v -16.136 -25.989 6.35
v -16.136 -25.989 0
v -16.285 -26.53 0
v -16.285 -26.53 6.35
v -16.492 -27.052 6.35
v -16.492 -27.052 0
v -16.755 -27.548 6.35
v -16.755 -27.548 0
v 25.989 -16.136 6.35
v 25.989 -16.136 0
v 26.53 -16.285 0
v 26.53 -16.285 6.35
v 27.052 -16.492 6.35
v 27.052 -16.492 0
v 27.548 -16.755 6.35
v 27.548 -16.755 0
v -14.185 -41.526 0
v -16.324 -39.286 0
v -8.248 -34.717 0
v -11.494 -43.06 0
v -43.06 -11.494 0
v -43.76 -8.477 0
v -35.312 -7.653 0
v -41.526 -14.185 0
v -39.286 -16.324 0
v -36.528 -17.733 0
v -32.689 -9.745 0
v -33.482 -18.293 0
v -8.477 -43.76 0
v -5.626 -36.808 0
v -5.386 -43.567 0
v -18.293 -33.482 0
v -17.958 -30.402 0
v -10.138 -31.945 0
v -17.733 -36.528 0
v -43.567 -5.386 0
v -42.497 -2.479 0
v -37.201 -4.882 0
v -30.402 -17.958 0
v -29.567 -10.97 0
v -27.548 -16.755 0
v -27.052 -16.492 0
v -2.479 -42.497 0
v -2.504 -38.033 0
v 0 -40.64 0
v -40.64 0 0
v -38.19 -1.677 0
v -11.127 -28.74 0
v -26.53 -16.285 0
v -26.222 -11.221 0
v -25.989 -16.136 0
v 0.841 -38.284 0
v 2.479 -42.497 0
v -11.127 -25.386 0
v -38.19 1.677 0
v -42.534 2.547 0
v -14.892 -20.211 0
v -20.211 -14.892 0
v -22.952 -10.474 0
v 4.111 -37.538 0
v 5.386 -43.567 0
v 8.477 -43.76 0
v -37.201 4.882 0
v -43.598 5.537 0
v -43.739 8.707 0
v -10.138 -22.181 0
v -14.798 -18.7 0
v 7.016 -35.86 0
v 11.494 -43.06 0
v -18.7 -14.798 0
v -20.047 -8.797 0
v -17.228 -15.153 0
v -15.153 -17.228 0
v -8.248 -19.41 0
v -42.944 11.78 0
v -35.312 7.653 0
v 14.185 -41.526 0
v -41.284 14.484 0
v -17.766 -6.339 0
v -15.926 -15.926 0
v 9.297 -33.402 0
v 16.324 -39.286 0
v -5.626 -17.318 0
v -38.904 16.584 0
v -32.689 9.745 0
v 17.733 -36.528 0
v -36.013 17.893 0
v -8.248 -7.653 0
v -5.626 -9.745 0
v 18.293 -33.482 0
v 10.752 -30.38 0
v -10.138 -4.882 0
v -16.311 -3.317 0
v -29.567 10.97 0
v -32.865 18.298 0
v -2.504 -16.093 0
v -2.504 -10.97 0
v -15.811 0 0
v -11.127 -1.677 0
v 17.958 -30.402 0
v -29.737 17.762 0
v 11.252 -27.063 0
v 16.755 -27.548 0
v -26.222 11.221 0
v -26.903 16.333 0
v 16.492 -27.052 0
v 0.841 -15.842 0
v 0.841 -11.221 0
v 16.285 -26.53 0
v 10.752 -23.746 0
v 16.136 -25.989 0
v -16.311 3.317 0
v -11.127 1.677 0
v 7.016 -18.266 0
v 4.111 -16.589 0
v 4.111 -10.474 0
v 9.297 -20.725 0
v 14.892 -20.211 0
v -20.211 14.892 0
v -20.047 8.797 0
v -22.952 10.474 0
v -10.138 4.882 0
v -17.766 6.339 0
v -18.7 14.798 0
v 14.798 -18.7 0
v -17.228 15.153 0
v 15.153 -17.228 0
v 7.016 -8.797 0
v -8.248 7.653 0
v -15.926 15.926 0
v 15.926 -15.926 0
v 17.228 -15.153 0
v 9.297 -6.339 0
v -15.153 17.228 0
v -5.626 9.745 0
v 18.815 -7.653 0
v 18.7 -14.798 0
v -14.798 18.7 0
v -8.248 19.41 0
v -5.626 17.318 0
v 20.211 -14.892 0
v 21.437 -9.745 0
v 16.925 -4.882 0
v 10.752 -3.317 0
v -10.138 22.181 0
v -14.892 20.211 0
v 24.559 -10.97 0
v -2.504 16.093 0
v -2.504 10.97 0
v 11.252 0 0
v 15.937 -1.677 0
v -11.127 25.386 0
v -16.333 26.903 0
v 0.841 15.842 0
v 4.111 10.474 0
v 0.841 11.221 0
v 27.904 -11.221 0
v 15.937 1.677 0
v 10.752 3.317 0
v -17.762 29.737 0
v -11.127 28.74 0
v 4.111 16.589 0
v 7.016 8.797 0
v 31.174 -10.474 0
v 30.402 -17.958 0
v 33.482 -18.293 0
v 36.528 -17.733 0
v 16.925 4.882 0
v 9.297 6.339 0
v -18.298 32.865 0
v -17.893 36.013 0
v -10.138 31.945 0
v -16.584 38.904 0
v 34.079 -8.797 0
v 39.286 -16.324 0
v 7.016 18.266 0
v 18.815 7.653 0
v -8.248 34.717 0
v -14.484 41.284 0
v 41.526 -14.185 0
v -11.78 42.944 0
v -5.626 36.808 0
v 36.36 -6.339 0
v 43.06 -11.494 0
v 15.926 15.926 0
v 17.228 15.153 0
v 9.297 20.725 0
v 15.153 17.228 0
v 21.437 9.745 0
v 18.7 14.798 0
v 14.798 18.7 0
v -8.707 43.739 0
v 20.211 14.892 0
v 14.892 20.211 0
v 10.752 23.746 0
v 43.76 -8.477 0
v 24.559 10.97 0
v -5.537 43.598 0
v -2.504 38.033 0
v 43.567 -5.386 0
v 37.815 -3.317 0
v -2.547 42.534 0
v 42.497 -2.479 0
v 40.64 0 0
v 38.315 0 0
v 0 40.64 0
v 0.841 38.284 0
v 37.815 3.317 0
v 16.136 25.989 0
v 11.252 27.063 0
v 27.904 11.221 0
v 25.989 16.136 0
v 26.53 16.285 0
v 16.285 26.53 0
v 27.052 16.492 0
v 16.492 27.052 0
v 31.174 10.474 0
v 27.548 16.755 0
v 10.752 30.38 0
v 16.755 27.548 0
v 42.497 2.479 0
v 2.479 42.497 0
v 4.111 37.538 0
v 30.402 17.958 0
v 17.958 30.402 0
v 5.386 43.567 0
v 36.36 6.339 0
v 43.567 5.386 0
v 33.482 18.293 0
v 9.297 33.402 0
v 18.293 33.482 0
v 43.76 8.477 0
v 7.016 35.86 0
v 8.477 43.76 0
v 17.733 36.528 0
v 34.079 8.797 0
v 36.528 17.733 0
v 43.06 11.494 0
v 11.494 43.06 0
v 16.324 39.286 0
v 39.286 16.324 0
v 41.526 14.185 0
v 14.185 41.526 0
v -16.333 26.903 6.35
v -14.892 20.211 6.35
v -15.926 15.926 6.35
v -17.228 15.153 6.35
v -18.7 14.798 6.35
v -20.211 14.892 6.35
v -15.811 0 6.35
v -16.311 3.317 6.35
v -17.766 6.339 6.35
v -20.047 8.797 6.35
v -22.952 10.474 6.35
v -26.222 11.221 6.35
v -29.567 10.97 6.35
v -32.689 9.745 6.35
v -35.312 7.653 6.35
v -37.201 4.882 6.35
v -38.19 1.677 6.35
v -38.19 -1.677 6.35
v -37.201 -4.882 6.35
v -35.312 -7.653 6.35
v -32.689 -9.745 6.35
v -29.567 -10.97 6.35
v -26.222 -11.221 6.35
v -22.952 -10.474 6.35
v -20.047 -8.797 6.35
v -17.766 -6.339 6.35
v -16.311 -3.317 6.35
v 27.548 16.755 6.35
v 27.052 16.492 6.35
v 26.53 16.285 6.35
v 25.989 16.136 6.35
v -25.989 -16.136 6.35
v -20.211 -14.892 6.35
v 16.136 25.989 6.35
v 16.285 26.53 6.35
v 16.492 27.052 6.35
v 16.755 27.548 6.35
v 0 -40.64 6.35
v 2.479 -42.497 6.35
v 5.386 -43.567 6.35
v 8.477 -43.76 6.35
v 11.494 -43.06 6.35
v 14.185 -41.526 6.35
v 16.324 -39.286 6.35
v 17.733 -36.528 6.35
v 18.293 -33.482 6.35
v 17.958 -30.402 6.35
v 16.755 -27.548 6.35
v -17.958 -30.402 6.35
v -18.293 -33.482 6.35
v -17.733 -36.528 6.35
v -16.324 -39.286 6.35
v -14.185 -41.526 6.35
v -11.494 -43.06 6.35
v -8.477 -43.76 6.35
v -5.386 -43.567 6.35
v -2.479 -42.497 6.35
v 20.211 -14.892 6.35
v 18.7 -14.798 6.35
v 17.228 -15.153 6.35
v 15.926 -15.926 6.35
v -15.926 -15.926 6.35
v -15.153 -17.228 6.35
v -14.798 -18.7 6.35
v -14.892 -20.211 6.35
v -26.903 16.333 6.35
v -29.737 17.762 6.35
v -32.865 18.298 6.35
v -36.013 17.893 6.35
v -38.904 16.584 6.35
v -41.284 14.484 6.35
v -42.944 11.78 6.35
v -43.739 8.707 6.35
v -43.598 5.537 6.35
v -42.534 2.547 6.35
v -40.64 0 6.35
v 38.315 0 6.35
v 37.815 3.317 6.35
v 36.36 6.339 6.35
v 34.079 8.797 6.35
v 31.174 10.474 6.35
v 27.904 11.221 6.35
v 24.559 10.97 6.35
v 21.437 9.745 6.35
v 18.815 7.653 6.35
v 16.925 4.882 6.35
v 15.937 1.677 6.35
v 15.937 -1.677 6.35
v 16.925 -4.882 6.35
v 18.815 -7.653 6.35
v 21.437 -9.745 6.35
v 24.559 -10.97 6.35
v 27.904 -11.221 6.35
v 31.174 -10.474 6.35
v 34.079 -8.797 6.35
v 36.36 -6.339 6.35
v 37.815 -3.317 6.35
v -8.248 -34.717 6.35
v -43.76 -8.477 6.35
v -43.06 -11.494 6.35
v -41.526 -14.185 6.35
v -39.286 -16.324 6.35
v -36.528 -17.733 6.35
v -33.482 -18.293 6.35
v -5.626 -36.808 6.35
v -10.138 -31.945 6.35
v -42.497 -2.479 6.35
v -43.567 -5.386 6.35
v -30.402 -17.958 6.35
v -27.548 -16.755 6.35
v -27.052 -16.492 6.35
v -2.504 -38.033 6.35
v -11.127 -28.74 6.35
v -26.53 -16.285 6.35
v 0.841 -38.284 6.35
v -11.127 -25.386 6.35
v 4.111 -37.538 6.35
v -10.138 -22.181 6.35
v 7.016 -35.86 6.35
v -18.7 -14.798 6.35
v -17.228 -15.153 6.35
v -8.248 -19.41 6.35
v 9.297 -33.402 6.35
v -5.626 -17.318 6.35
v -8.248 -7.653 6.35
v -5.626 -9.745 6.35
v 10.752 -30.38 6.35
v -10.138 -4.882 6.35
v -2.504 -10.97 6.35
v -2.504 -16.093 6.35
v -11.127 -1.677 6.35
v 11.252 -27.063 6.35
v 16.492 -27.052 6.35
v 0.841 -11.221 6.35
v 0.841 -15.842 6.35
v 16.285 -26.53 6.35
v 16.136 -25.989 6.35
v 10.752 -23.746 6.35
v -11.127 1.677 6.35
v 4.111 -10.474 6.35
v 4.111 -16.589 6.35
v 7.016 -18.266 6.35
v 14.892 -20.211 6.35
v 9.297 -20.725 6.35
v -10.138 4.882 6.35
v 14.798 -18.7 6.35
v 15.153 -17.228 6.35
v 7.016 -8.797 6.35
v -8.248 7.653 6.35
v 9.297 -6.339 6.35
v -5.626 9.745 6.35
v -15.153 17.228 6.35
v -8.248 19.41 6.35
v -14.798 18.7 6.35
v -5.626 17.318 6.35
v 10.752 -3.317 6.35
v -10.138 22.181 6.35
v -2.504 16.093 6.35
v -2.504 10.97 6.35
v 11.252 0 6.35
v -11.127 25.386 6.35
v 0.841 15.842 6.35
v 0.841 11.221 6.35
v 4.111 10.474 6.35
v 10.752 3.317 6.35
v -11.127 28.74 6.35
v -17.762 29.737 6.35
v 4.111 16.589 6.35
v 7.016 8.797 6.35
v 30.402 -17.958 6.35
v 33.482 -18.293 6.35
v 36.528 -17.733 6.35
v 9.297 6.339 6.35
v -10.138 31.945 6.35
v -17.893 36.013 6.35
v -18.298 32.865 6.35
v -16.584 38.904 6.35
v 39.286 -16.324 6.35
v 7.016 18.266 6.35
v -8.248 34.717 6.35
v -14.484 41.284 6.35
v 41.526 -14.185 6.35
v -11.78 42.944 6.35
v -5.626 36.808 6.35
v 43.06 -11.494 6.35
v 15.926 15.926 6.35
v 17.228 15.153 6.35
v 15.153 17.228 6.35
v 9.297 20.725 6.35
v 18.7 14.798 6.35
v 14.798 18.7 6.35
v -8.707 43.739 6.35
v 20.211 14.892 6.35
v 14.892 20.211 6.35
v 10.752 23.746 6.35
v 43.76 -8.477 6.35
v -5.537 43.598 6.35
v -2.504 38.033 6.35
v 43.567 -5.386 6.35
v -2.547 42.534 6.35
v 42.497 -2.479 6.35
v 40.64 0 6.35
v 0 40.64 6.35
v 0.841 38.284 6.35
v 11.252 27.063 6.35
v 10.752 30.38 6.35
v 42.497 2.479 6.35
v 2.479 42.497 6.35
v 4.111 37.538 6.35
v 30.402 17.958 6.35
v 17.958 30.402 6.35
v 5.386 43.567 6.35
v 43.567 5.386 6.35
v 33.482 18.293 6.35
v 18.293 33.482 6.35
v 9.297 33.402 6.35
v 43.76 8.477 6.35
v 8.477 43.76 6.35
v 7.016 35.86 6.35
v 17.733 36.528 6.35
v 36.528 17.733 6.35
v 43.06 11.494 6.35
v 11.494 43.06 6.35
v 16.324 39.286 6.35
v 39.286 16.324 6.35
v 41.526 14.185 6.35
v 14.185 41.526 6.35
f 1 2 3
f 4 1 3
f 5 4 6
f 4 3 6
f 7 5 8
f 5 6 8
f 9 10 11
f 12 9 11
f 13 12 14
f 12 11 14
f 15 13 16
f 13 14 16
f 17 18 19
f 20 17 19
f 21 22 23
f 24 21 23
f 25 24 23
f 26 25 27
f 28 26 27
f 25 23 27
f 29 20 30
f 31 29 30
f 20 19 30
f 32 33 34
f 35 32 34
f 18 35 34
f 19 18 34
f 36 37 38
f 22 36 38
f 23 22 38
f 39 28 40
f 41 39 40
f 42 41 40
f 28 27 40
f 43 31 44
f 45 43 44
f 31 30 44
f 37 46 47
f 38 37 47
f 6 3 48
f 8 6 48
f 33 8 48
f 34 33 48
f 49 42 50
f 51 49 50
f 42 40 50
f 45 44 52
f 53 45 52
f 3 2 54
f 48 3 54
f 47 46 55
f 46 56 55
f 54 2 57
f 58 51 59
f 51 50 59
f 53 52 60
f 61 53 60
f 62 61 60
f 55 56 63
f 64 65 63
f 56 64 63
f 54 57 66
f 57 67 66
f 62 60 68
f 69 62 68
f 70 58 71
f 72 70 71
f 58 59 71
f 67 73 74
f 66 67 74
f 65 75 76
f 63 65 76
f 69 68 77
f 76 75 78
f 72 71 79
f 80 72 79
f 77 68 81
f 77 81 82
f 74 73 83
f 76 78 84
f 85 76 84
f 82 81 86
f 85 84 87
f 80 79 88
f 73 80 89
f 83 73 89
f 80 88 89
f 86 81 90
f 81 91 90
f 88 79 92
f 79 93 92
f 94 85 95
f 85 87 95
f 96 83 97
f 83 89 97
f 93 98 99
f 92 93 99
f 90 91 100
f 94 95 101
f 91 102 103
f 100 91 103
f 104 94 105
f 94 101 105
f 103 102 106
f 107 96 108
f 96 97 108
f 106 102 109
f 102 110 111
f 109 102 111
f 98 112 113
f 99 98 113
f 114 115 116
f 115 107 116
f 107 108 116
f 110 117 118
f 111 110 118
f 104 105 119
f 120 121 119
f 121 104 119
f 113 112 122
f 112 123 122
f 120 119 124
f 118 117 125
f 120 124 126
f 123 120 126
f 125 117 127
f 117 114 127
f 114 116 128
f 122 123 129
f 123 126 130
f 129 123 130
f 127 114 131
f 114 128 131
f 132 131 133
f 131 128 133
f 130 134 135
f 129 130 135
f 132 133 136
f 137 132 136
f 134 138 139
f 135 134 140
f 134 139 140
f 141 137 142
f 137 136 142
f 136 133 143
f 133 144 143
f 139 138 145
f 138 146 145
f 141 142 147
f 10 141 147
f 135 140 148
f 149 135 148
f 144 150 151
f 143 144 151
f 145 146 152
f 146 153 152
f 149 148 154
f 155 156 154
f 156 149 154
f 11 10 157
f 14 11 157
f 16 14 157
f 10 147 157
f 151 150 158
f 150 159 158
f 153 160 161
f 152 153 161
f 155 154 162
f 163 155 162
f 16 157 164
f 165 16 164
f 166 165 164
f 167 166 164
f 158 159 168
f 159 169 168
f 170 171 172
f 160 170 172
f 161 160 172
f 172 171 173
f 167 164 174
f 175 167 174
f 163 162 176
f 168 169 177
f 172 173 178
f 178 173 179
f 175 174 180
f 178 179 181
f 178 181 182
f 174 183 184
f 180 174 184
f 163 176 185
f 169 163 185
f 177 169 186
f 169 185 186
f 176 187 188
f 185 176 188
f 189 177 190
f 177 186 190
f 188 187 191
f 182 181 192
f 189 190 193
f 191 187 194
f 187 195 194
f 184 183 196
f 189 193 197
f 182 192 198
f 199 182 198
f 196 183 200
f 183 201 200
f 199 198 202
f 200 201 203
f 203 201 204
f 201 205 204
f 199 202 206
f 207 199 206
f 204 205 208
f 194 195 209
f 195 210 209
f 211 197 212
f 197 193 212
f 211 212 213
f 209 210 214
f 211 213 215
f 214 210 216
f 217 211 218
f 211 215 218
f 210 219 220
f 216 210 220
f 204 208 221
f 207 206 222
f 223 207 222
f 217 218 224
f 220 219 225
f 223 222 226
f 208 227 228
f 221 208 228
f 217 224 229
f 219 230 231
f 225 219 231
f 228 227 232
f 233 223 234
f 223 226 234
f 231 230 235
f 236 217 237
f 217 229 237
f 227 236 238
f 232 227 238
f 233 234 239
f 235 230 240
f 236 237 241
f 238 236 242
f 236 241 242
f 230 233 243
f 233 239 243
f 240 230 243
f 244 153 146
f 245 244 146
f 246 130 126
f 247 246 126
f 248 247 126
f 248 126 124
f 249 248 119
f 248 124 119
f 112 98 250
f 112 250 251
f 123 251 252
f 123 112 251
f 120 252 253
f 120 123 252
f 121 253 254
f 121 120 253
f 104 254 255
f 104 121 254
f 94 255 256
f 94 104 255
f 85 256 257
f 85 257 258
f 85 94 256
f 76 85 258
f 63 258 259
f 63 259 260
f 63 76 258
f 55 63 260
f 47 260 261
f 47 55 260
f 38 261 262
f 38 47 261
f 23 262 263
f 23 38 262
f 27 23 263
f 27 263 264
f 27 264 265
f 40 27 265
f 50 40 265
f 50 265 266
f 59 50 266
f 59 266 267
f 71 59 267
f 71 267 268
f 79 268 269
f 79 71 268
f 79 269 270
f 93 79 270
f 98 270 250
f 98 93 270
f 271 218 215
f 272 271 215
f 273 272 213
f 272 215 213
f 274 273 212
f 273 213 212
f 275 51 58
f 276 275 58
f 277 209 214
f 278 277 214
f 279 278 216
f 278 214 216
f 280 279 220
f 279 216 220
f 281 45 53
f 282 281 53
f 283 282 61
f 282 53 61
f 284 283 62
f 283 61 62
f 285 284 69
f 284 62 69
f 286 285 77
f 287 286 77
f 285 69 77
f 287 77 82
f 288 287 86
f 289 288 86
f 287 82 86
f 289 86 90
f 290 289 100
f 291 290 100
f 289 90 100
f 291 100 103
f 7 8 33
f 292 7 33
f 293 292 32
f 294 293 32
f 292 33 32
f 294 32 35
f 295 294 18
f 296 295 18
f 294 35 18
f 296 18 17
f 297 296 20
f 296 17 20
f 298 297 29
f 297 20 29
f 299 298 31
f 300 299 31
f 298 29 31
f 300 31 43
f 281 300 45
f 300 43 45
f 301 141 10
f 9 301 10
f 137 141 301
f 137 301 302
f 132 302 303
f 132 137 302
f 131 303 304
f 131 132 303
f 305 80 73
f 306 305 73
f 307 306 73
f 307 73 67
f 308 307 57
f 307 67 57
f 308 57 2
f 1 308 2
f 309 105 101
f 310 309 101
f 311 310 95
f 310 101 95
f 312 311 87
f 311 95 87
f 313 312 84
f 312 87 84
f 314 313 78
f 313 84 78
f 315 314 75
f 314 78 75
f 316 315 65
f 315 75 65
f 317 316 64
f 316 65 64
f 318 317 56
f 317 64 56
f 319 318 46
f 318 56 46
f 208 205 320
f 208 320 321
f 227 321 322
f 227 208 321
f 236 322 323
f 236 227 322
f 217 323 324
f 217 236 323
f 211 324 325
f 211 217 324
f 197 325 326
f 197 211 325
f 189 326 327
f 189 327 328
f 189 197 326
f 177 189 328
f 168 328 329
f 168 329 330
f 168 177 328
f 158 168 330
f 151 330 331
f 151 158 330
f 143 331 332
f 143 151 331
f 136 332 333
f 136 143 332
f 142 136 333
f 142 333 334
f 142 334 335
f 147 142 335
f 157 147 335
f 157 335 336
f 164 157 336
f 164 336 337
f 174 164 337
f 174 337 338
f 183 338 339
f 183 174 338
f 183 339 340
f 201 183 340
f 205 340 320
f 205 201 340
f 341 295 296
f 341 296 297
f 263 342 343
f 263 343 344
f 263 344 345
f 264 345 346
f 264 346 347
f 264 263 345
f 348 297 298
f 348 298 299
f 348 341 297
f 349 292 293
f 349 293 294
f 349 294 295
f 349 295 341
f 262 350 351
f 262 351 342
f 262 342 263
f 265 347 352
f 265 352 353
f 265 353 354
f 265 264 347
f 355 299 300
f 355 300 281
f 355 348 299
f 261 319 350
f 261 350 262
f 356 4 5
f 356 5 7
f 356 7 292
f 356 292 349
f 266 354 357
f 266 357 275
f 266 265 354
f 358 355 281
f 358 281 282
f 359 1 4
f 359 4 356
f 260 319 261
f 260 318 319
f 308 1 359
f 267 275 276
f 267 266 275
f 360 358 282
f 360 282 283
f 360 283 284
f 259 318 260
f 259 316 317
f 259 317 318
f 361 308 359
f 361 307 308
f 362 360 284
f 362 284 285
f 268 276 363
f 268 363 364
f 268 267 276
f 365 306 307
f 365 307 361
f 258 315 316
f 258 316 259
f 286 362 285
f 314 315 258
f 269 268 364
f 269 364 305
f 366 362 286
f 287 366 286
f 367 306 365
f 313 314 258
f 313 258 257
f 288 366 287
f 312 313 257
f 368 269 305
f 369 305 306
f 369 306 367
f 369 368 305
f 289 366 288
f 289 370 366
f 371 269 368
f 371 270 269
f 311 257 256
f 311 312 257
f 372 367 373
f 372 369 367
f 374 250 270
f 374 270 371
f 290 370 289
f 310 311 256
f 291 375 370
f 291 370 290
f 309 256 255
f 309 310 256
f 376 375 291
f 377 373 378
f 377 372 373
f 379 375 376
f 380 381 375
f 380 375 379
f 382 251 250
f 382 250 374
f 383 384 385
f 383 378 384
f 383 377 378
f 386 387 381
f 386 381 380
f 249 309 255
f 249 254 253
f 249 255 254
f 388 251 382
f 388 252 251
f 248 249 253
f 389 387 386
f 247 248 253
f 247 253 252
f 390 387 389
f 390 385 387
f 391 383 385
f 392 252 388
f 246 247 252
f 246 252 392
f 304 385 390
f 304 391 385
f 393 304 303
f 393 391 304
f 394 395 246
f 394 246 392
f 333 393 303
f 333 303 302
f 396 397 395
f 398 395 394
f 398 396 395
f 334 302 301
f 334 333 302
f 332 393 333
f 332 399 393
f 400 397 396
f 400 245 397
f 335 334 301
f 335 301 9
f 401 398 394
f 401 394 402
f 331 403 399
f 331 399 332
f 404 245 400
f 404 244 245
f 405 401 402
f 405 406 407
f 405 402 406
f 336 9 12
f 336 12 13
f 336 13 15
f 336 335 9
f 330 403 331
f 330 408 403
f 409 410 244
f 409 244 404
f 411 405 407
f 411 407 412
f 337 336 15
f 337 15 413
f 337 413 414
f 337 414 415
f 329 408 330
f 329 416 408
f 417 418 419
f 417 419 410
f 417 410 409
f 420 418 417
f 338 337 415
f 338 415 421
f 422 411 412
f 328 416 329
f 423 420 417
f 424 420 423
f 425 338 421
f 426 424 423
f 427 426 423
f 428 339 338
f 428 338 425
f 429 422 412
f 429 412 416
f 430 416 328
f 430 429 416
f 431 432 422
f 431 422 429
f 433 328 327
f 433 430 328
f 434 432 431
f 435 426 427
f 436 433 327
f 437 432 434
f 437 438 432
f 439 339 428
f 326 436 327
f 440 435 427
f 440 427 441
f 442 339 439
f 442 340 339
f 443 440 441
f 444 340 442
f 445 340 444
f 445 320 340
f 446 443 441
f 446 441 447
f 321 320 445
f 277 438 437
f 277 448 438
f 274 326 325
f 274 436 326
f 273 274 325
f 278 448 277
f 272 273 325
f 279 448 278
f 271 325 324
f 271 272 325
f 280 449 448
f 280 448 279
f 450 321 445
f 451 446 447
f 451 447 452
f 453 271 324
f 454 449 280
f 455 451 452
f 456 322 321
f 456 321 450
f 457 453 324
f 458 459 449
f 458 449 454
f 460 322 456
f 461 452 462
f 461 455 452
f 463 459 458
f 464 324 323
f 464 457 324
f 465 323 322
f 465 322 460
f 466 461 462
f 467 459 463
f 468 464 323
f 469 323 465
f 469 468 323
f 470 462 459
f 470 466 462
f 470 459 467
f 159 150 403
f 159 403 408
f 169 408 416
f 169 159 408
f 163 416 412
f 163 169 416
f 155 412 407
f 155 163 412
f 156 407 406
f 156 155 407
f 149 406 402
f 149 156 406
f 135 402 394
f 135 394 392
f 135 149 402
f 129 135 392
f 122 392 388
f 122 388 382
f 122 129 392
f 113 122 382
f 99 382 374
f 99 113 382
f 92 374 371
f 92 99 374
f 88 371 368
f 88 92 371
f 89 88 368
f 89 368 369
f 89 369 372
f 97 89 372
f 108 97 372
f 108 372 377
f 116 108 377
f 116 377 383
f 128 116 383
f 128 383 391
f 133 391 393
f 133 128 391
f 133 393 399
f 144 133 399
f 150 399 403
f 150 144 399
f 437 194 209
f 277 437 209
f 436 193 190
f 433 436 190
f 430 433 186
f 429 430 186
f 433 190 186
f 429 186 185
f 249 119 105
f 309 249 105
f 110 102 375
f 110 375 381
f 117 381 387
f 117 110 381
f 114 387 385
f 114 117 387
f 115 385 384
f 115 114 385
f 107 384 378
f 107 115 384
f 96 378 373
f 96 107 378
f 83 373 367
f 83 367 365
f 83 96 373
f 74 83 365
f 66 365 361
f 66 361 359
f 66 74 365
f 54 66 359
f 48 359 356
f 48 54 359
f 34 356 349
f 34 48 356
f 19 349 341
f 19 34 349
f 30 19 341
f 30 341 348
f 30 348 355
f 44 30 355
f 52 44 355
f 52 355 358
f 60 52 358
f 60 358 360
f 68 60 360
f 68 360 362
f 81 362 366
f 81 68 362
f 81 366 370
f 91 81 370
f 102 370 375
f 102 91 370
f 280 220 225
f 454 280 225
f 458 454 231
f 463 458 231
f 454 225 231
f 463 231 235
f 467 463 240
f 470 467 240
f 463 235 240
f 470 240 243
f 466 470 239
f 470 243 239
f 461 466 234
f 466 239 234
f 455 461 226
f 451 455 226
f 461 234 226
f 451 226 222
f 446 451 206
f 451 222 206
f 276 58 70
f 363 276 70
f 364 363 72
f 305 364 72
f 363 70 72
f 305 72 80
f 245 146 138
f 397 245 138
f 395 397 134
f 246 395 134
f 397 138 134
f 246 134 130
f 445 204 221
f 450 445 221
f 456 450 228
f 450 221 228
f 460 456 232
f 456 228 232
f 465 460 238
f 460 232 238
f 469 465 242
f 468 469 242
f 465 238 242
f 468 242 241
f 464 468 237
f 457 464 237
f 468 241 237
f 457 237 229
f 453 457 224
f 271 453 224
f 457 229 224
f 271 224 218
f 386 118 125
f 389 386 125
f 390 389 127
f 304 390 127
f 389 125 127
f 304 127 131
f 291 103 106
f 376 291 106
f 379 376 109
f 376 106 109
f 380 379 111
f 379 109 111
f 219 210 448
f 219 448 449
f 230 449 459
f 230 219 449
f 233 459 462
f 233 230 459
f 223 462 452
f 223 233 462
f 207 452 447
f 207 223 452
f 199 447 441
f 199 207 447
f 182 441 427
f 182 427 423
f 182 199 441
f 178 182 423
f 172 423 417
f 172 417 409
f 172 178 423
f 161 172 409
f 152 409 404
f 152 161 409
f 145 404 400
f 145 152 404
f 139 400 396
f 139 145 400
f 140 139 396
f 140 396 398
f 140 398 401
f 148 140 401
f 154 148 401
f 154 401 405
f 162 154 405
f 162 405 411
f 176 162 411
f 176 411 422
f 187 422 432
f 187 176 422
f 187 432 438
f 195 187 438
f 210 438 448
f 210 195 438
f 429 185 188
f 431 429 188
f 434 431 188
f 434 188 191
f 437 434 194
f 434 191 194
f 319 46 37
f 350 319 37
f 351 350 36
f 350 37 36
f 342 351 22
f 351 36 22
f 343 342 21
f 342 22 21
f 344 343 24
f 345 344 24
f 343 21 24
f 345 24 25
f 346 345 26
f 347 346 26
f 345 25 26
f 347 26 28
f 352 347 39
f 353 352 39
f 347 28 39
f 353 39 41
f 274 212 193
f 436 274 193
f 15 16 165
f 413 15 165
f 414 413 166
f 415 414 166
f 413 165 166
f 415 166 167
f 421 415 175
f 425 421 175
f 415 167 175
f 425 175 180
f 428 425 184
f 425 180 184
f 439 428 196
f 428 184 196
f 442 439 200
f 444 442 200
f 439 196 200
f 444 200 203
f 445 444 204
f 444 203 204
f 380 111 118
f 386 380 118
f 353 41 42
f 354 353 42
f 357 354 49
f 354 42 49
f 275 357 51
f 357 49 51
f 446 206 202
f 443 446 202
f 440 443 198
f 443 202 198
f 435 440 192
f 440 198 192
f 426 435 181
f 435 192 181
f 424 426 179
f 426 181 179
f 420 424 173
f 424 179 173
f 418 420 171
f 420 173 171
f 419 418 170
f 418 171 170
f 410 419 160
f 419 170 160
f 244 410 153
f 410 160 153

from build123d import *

# Parameters (mm, degrees)
F0_R        = 11.2522
F1_DEPTH    = 6.35
F2_T1_DEPTH = 6.35


# Not quite as in the source:
# - a fillet or chamfer that OpenCascade refuses, or shapes differently, is made with other operations: its cross-section is extruded or revolved along the edge and cut away or added


with BuildPart() as f1:
    # F0 (on Top) → F1 (new body)
    with BuildSketch(Plane.XY):
        with BuildLine():
            Line((-16.3332085084, 26.9033375639), (-14.2845390508, 17.386659874))
            ThreePointArc((-14.2845390508, 17.386659874), (-15.9113795359, 15.9113795359), (-17.386659874, 14.2845390508))
            Line((-17.386659874, 14.2845390508), (-26.9033375639, 16.3332085084))
            ThreePointArc((-26.9033375639, 16.3332085084), (-41.2837315607, 14.4844486959), (-40.64, 0))
            ThreePointArc((-40.64, 0), (-41.2837315607, -14.4844486959), (-26.9033375639, -16.3332085084))
            Line((-26.9033375639, -16.3332085084), (-17.386659874, -14.2845390508))
            ThreePointArc((-17.386659874, -14.2845390508), (-15.9113795359, -15.9113795359), (-14.2845390508, -17.386659874))
            Line((-14.2845390508, -17.386659874), (-16.3332085084, -26.9033375639))
            ThreePointArc((-16.3332085084, -26.9033375639), (-14.4844486959, -41.2837315607), (0, -40.64))
            ThreePointArc((0, -40.64), (14.4844486959, -41.2837315607), (16.3332085084, -26.9033375639))
            Line((16.3332085084, -26.9033375639), (14.2845390508, -17.386659874))
            ThreePointArc((14.2845390508, -17.386659874), (15.9113795359, -15.9113795359), (17.386659874, -14.2845390508))
            Line((17.386659874, -14.2845390508), (26.9033375639, -16.3332085084))
            ThreePointArc((26.9033375639, -16.3332085084), (41.2837315607, -14.4844486959), (40.64, 0))
            ThreePointArc((40.64, 0), (41.2837315607, 14.4844486959), (26.9033375639, 16.3332085084))
            Line((26.9033375639, 16.3332085084), (17.386659874, 14.2845390508))
            ThreePointArc((17.386659874, 14.2845390508), (15.9113795359, 15.9113795359), (14.2845390508, 17.386659874))
            Line((14.2845390508, 17.386659874), (16.3332085084, 26.9033375639))
            ThreePointArc((16.3332085084, 26.9033375639), (14.4844486959, 41.2837315607), (0, 40.64))
            ThreePointArc((0, 40.64), (-14.4844486959, 41.2837315607), (-16.3332085084, 26.9033375639))
        make_face()
        with Locations((0, -27.0631238818)):
            Circle(F0_R, mode=Mode.SUBTRACT)
        with Locations((-27.0631238818, 0)):
            Circle(F0_R, mode=Mode.SUBTRACT)
        Circle(F0_R, mode=Mode.SUBTRACT)
        with Locations((27.0631238818, 0)):
            Circle(F0_R, mode=Mode.SUBTRACT)
        with Locations((0, 27.0631238818)):
            Circle(F0_R, mode=Mode.SUBTRACT)
    extrude(amount=F1_DEPTH)

    # F2: fillet of radius 5.08 on 14 edges, made by hand

    # F2_s2 → F2_t1 (join)
    with BuildSketch(Plane.XY):
        with BuildLine():
            ThreePointArc((-15.61619491, 16.2011868084), (-17.7500326172, 14.9730442969), (-20.2107454114, 14.8924841735))
            Line((-20.2107454114, 14.8924841735), (-17.386659874, 14.2845390508))
            ThreePointArc((-17.386659874, 14.2845390508), (-16.5292313987, 15.2685463237), (-15.61619491, 16.2011868084))
        make_face()
        with BuildLine():
            ThreePointArc((-14.8924841735, 20.2107454114), (-14.9730442969, 17.7500326172), (-16.2011868084, 15.61619491))
            ThreePointArc((-16.2011868084, 15.61619491), (-15.2685463237, 16.5292313987), (-14.2845390508, 17.386659874))
            Line((-14.2845390508, 17.386659874), (-14.8924841735, 20.2107454114))
        make_face()
        with BuildLine():
            ThreePointArc((20.2107454114, -14.8924841735), (17.7500326172, -14.9730442969), (15.61619491, -16.2011868084))
            ThreePointArc((15.61619491, -16.2011868084), (16.5292313987, -15.2685463237), (17.386659874, -14.2845390508))
            Line((17.386659874, -14.2845390508), (20.2107454114, -14.8924841735))
        make_face()
        with BuildLine():
            ThreePointArc((25.9885821775, -16.1362877465), (26.7940259506, -16.3810221446), (27.5479957457, -16.7554071673))
            ThreePointArc((27.5479957457, -16.7554071673), (27.221867498, -16.5501087977), (26.9033375639, -16.3332085084))
            Line((26.9033375639, -16.3332085084), (25.9885821775, -16.1362877465))
        make_face()
        with BuildLine():
            ThreePointArc((27.5479957457, 16.7554071673), (26.7940259506, 16.3810221446), (25.9885821775, 16.1362877465))
            Line((25.9885821775, 16.1362877465), (26.9033375639, 16.3332085084))
            ThreePointArc((26.9033375639, 16.3332085084), (27.221867498, 16.5501087977), (27.5479957457, 16.7554071673))
        make_face()
        with BuildLine():
            ThreePointArc((20.2107454114, 14.8924841735), (17.7500326172, 14.9730442969), (15.61619491, 16.2011868084))
            ThreePointArc((15.61619491, 16.2011868084), (16.5292313987, 15.2685463237), (17.386659874, 14.2845390508))
            Line((17.386659874, 14.2845390508), (20.2107454114, 14.8924841735))
        make_face()
        with BuildLine():
            ThreePointArc((16.2011868084, 15.61619491), (14.9730442969, 17.7500326172), (14.8924841735, 20.2107454114))
            Line((14.8924841735, 20.2107454114), (14.2845390508, 17.386659874))
            ThreePointArc((14.2845390508, 17.386659874), (15.2685463237, 16.5292313987), (16.2011868084, 15.61619491))
        make_face()
        with BuildLine():
            ThreePointArc((16.1362877465, 25.9885821775), (16.3810221446, 26.7940259506), (16.7554071673, 27.5479957457))
            ThreePointArc((16.7554071673, 27.5479957457), (16.5501087977, 27.221867498), (16.3332085084, 26.9033375639))
            Line((16.3332085084, 26.9033375639), (16.1362877465, 25.9885821775))
        make_face()
        with BuildLine():
            ThreePointArc((-27.5479957457, -16.7554071673), (-26.7940259506, -16.3810221446), (-25.9885821775, -16.1362877465))
            Line((-25.9885821775, -16.1362877465), (-26.9033375639, -16.3332085084))
            ThreePointArc((-26.9033375639, -16.3332085084), (-27.221867498, -16.5501087977), (-27.5479957457, -16.7554071673))
        make_face()
        with BuildLine():
            ThreePointArc((-20.2107454114, -14.8924841735), (-17.7500326172, -14.9730442969), (-15.61619491, -16.2011868084))
            ThreePointArc((-15.61619491, -16.2011868084), (-16.5292313987, -15.2685463237), (-17.386659874, -14.2845390508))
            Line((-17.386659874, -14.2845390508), (-20.2107454114, -14.8924841735))
        make_face()
        with BuildLine():
            ThreePointArc((-16.2011868084, -15.61619491), (-14.9730442969, -17.7500326172), (-14.8924841735, -20.2107454114))
            Line((-14.8924841735, -20.2107454114), (-14.2845390508, -17.386659874))
            ThreePointArc((-14.2845390508, -17.386659874), (-15.2685463237, -16.5292313987), (-16.2011868084, -15.61619491))
        make_face()
        with BuildLine():
            ThreePointArc((-16.1362877465, -25.9885821775), (-16.3810221446, -26.7940259506), (-16.7554071673, -27.5479957457))
            ThreePointArc((-16.7554071673, -27.5479957457), (-16.5501087977, -27.221867498), (-16.3332085084, -26.9033375639))
            Line((-16.3332085084, -26.9033375639), (-16.1362877465, -25.9885821775))
        make_face()
        with BuildLine():
            ThreePointArc((16.7554071673, -27.5479957457), (16.3810221446, -26.7940259506), (16.1362877465, -25.9885821775))
            Line((16.1362877465, -25.9885821775), (16.3332085084, -26.9033375639))
            ThreePointArc((16.3332085084, -26.9033375639), (16.5501087977, -27.221867498), (16.7554071673, -27.5479957457))
        make_face()
        with BuildLine():
            ThreePointArc((14.8924841735, -20.2107454114), (14.9730442969, -17.7500326172), (16.2011868084, -15.61619491))
            ThreePointArc((16.2011868084, -15.61619491), (15.2685463237, -16.5292313987), (14.2845390508, -17.386659874))
            Line((14.2845390508, -17.386659874), (14.8924841735, -20.2107454114))
        make_face()
    extrude(amount=F2_T1_DEPTH)


solid = f1.part
